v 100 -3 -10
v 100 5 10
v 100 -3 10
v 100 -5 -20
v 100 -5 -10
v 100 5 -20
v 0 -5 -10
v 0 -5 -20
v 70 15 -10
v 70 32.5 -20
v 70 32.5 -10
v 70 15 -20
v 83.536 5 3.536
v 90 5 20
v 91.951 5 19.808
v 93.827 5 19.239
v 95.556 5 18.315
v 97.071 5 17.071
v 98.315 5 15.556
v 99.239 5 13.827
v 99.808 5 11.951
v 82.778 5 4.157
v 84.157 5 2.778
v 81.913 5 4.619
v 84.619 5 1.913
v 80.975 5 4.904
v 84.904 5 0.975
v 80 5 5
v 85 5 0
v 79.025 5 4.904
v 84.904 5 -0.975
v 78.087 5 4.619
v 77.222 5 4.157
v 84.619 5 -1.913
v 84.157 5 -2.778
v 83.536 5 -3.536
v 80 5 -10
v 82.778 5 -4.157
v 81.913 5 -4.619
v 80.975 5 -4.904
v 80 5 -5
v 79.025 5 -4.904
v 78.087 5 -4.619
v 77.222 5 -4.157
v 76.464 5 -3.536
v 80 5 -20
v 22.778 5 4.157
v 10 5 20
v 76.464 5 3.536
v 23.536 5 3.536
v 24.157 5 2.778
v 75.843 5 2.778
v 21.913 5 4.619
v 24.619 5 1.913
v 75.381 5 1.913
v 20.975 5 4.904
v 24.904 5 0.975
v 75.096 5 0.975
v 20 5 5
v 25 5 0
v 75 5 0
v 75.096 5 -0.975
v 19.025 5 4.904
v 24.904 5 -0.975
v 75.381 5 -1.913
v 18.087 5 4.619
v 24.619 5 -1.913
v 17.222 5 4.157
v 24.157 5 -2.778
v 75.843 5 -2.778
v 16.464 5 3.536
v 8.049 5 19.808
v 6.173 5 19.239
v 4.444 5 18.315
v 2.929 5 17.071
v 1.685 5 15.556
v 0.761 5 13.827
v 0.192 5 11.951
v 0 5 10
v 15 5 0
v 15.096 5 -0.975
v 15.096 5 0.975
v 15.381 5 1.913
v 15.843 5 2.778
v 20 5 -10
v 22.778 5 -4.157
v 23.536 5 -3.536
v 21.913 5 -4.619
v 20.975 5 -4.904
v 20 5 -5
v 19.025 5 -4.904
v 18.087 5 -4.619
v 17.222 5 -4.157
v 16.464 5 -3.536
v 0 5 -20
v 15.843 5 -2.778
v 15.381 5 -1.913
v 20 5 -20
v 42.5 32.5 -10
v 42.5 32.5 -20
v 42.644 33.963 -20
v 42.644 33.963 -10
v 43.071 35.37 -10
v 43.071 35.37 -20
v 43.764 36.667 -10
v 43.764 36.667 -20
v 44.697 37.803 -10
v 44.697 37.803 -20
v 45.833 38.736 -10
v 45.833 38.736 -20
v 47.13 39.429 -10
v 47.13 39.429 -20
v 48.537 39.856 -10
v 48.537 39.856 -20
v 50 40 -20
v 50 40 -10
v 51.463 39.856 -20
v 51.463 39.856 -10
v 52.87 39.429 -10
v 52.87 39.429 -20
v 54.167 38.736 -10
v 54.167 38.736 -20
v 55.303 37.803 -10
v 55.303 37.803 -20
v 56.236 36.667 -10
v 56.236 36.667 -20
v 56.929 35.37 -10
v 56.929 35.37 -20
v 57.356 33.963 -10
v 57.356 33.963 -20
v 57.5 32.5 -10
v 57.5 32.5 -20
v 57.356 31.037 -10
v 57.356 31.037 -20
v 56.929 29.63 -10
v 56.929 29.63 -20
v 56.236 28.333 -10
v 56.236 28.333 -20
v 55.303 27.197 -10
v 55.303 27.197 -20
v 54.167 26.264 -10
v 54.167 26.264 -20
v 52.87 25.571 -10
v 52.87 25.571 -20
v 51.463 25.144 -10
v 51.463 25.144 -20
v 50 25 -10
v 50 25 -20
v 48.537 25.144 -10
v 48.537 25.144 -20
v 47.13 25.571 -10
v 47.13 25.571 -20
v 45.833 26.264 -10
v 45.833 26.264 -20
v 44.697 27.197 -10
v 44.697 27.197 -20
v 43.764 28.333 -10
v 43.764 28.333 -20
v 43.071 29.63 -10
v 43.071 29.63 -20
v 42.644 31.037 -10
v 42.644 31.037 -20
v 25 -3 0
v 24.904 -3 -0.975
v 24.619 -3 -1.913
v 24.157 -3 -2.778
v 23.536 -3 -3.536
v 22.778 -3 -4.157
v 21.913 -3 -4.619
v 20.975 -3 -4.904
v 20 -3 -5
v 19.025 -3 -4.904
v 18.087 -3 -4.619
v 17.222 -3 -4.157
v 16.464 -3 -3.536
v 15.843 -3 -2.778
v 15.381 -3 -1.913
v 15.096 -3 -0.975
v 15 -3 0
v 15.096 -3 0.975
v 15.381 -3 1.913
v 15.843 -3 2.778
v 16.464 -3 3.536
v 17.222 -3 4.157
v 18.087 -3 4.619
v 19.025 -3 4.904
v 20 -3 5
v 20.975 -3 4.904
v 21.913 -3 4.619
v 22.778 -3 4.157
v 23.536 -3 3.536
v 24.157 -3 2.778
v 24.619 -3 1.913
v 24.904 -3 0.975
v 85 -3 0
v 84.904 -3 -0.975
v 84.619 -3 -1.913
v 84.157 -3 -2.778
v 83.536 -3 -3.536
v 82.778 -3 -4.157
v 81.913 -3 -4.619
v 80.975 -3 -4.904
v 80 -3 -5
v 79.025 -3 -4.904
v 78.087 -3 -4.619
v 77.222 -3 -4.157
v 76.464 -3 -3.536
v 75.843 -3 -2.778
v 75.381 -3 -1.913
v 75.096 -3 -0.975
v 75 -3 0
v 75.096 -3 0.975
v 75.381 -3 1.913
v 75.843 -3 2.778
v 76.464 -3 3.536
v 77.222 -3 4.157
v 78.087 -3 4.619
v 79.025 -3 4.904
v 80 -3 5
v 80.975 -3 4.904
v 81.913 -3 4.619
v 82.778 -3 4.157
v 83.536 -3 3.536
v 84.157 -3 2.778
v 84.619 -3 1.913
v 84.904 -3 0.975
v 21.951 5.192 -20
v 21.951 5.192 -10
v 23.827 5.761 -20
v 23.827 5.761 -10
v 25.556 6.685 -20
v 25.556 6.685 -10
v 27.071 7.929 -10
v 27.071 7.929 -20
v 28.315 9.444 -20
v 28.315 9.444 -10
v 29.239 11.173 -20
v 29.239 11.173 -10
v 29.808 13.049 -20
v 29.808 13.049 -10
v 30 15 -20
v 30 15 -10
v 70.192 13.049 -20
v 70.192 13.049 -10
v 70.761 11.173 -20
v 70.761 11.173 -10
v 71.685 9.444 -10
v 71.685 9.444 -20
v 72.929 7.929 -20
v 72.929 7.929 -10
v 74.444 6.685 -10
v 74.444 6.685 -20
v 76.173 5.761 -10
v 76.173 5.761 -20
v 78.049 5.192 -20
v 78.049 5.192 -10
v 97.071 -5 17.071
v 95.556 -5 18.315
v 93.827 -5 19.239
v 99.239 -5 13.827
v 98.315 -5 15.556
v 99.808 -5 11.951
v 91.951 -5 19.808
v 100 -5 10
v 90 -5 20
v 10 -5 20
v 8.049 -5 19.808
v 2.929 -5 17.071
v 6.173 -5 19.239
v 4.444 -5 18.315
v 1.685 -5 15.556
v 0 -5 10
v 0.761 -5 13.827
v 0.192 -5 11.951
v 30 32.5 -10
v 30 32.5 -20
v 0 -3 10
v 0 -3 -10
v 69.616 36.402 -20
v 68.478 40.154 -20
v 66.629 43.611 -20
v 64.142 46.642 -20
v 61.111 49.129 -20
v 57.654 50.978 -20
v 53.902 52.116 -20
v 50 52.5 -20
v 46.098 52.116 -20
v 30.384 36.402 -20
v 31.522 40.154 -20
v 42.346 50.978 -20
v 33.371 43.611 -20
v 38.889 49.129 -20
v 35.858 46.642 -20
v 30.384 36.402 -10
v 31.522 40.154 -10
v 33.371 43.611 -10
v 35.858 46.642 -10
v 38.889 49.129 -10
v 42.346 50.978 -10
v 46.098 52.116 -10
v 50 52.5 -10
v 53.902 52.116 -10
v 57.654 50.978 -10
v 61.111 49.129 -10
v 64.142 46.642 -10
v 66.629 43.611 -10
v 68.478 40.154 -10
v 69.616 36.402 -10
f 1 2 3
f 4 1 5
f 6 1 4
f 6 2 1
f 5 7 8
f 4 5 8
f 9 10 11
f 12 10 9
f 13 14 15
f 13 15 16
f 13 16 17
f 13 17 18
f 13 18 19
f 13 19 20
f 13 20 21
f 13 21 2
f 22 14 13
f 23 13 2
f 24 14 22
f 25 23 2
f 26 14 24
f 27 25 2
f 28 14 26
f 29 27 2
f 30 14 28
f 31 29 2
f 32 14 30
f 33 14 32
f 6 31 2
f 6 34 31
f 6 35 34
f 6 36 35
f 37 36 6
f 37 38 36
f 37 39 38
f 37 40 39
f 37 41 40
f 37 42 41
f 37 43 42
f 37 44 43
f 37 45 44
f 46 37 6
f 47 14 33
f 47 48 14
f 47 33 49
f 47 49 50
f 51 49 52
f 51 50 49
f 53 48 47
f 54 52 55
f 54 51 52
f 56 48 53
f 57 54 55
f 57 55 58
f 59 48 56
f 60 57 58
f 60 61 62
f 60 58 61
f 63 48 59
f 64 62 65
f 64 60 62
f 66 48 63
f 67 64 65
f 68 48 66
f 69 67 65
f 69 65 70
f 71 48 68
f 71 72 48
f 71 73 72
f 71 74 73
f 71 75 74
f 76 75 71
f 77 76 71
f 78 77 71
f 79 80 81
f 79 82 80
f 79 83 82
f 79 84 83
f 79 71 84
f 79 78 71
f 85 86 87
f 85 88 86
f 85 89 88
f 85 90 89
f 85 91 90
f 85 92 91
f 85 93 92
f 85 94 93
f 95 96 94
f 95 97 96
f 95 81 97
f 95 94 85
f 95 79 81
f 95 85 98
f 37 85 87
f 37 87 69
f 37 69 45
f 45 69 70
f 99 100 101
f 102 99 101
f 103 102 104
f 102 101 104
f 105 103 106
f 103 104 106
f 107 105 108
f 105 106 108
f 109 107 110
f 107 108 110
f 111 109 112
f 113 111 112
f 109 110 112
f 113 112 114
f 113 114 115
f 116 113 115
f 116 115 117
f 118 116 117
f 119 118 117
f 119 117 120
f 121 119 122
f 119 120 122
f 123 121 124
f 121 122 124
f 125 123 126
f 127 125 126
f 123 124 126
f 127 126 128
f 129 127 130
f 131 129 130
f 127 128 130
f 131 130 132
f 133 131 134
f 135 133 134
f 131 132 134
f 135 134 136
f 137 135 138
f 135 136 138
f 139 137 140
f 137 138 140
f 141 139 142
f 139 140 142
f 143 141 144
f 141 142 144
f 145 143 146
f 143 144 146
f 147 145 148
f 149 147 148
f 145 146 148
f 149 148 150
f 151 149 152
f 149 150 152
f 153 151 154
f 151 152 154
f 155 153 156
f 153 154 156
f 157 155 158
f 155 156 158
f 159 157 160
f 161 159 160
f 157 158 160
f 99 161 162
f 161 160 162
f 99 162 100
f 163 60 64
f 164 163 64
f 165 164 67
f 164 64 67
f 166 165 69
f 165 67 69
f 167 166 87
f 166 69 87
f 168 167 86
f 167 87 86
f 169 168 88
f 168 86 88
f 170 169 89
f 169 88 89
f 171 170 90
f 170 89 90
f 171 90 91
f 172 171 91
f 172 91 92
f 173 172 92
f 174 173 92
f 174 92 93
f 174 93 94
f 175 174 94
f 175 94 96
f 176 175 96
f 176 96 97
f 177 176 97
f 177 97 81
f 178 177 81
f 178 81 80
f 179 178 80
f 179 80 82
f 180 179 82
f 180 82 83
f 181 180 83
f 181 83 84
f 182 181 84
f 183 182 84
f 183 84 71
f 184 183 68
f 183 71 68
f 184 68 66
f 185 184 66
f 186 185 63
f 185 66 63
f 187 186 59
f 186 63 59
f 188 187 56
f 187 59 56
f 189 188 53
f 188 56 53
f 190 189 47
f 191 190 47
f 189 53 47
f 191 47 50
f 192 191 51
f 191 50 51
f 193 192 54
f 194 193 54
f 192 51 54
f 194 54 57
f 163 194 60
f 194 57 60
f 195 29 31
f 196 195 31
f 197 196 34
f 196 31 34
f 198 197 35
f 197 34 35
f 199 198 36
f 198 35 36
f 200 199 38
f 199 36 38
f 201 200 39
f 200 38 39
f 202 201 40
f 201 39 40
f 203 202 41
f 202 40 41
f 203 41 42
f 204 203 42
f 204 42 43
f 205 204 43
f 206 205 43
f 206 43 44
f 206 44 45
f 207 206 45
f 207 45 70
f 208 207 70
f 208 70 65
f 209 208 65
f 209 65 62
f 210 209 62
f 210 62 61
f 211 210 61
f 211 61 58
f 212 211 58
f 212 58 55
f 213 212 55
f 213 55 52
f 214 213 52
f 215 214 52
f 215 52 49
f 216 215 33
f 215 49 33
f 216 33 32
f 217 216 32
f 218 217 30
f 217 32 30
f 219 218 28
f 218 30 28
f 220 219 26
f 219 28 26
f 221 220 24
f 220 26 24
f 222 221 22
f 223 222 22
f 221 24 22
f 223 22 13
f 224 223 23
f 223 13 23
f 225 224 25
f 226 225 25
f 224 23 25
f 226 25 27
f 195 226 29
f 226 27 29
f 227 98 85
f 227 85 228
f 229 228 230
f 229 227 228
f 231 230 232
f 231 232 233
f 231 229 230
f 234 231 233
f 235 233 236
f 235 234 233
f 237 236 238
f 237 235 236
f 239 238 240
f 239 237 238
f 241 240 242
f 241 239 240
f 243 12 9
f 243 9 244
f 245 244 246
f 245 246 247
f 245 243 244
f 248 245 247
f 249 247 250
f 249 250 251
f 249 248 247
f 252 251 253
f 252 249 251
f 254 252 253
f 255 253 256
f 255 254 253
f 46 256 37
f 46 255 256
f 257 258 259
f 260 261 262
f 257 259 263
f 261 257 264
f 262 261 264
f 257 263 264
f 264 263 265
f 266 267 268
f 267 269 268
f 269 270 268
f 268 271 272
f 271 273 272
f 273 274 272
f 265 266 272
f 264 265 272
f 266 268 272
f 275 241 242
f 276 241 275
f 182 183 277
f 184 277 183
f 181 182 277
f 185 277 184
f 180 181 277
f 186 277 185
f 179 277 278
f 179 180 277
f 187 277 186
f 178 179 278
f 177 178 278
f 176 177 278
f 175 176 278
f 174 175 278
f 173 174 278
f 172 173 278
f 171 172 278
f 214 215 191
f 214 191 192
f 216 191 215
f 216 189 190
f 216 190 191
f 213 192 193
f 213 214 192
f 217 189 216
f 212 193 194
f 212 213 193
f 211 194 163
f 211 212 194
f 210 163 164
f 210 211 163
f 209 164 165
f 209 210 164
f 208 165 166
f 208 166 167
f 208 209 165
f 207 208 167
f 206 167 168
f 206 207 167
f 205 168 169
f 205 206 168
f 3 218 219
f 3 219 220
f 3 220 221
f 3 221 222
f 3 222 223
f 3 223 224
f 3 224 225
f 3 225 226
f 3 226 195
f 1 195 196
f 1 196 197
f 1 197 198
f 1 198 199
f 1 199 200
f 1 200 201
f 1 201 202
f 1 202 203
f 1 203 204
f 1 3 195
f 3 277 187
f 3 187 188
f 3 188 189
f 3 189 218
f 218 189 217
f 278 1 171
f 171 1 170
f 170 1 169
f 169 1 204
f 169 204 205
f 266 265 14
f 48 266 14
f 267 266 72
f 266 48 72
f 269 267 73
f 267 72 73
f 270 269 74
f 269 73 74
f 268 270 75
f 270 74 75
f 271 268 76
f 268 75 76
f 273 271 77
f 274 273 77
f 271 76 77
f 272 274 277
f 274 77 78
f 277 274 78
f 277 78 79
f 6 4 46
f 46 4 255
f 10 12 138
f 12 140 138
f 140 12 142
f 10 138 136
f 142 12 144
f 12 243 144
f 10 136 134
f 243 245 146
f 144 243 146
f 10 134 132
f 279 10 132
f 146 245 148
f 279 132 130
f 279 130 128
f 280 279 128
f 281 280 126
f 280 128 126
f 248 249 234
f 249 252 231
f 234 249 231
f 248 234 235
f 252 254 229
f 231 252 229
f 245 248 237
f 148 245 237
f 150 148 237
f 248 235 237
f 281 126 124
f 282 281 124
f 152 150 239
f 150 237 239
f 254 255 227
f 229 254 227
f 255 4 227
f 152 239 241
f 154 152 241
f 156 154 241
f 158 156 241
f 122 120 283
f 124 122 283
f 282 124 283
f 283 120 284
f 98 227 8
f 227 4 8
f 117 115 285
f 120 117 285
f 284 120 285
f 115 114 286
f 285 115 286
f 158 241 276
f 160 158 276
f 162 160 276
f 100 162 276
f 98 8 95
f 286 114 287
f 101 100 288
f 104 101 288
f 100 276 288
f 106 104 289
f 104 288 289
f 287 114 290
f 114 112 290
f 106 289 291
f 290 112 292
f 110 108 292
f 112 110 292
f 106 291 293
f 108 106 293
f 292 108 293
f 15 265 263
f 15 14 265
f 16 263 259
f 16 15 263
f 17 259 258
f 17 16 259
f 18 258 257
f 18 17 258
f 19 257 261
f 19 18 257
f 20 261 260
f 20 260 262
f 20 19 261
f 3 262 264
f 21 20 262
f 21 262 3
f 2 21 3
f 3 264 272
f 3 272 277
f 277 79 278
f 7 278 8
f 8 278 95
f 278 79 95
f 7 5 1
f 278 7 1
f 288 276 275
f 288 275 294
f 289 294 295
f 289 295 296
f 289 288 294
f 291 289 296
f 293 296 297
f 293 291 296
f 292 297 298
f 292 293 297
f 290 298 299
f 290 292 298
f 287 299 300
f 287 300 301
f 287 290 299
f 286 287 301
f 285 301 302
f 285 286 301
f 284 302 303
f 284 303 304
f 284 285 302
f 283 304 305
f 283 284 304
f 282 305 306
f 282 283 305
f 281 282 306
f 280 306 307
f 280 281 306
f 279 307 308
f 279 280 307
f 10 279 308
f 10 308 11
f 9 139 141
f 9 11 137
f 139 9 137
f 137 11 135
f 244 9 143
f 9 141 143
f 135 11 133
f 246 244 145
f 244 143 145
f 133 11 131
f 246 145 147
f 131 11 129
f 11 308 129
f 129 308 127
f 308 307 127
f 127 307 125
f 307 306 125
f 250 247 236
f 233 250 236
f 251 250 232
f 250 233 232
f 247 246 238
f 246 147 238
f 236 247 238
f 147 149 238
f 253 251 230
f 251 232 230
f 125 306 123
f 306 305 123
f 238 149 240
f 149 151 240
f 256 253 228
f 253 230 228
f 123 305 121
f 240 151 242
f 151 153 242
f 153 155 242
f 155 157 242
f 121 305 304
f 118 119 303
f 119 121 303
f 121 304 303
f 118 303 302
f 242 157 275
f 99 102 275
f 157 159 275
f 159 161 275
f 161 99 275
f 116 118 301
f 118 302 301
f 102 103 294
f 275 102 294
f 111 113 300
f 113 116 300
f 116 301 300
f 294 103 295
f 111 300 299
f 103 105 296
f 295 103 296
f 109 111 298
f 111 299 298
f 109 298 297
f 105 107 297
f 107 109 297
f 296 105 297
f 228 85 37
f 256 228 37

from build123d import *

# Parameters (mm, degrees)
CROQUIS1_W              = 40
CROQUIS1_H              = 10
SALIENTE_EXTRUIR1_DEPTH = 100
REDONDEO2_R             = 10
CROQUIS2_W              = 20
CROQUIS2_H              = 2
CORTAR_EXTRUIR1_DEPTH   = 100
CROQUIS3_R              = 5
CORTAR_EXTRUIR2_DEPTH   = 10
CROQUIS5_R              = 7.5
SALIENTE_EXTRUIR3_DEPTH = 10


with BuildPart() as part:
    # Croquis1 → Saliente-Extruir1 (new body)
    with BuildSketch(Plane(origin=(0, 0, 0), x_dir=(0, 0, -1), z_dir=(1, 0, 0))):
        Rectangle(CROQUIS1_W, CROQUIS1_H)
    extrude(amount=SALIENTE_EXTRUIR1_DEPTH)

    # Redondeo2
    redondeo2_edges = [part.edges().sort_by_distance(p)[0] for p in [
        (100, 0, 20),
        (0, 0, 20),
    ]]
    fillet(redondeo2_edges, radius=REDONDEO2_R)

    # Croquis2 → Cortar-Extruir1 (cut)
    with BuildSketch(Plane(origin=(100, 0, 0), x_dir=(0, 0, -1), z_dir=(1, 0, 0))):
        with Locations((0, -4)):
            Rectangle(CROQUIS2_W, CROQUIS2_H)
    extrude(amount=-CORTAR_EXTRUIR1_DEPTH, mode=Mode.SUBTRACT)

    # Croquis3 → Cortar-Extruir2 (cut)
    with BuildSketch(Plane(origin=(0, 5, 0), x_dir=(1, 0, 0), z_dir=(0, 1, 0))):
        with Locations((20, 0)):
            Circle(CROQUIS3_R)
        with Locations((80, 0)):
            Circle(CROQUIS3_R)
    extrude(amount=-CORTAR_EXTRUIR2_DEPTH, mode=Mode.SUBTRACT)

    # Croquis5 → Saliente-Extruir3 (add)
    with BuildSketch(Plane(origin=(0, 0, -20), x_dir=(-1, 0, 0), z_dir=(0, 0, -1))):
        with BuildLine():
            Line((-70, 32.5), (-70, 15))
            ThreePointArc((-70, 15), (-72.928932188, 7.928932188), (-80, 5))
            Line((-80, 5), (-20, 5))
            ThreePointArc((-20, 5), (-27.071067812, 7.928932188), (-30, 15))
            Line((-30, 15), (-30, 32.5))
            ThreePointArc((-30, 32.5), (-50, 52.5), (-70, 32.5))
        make_face()
        with Locations((-50, 32.5)):
            Circle(CROQUIS5_R, mode=Mode.SUBTRACT)
    extrude(amount=-SALIENTE_EXTRUIR3_DEPTH)


solid = part.part
